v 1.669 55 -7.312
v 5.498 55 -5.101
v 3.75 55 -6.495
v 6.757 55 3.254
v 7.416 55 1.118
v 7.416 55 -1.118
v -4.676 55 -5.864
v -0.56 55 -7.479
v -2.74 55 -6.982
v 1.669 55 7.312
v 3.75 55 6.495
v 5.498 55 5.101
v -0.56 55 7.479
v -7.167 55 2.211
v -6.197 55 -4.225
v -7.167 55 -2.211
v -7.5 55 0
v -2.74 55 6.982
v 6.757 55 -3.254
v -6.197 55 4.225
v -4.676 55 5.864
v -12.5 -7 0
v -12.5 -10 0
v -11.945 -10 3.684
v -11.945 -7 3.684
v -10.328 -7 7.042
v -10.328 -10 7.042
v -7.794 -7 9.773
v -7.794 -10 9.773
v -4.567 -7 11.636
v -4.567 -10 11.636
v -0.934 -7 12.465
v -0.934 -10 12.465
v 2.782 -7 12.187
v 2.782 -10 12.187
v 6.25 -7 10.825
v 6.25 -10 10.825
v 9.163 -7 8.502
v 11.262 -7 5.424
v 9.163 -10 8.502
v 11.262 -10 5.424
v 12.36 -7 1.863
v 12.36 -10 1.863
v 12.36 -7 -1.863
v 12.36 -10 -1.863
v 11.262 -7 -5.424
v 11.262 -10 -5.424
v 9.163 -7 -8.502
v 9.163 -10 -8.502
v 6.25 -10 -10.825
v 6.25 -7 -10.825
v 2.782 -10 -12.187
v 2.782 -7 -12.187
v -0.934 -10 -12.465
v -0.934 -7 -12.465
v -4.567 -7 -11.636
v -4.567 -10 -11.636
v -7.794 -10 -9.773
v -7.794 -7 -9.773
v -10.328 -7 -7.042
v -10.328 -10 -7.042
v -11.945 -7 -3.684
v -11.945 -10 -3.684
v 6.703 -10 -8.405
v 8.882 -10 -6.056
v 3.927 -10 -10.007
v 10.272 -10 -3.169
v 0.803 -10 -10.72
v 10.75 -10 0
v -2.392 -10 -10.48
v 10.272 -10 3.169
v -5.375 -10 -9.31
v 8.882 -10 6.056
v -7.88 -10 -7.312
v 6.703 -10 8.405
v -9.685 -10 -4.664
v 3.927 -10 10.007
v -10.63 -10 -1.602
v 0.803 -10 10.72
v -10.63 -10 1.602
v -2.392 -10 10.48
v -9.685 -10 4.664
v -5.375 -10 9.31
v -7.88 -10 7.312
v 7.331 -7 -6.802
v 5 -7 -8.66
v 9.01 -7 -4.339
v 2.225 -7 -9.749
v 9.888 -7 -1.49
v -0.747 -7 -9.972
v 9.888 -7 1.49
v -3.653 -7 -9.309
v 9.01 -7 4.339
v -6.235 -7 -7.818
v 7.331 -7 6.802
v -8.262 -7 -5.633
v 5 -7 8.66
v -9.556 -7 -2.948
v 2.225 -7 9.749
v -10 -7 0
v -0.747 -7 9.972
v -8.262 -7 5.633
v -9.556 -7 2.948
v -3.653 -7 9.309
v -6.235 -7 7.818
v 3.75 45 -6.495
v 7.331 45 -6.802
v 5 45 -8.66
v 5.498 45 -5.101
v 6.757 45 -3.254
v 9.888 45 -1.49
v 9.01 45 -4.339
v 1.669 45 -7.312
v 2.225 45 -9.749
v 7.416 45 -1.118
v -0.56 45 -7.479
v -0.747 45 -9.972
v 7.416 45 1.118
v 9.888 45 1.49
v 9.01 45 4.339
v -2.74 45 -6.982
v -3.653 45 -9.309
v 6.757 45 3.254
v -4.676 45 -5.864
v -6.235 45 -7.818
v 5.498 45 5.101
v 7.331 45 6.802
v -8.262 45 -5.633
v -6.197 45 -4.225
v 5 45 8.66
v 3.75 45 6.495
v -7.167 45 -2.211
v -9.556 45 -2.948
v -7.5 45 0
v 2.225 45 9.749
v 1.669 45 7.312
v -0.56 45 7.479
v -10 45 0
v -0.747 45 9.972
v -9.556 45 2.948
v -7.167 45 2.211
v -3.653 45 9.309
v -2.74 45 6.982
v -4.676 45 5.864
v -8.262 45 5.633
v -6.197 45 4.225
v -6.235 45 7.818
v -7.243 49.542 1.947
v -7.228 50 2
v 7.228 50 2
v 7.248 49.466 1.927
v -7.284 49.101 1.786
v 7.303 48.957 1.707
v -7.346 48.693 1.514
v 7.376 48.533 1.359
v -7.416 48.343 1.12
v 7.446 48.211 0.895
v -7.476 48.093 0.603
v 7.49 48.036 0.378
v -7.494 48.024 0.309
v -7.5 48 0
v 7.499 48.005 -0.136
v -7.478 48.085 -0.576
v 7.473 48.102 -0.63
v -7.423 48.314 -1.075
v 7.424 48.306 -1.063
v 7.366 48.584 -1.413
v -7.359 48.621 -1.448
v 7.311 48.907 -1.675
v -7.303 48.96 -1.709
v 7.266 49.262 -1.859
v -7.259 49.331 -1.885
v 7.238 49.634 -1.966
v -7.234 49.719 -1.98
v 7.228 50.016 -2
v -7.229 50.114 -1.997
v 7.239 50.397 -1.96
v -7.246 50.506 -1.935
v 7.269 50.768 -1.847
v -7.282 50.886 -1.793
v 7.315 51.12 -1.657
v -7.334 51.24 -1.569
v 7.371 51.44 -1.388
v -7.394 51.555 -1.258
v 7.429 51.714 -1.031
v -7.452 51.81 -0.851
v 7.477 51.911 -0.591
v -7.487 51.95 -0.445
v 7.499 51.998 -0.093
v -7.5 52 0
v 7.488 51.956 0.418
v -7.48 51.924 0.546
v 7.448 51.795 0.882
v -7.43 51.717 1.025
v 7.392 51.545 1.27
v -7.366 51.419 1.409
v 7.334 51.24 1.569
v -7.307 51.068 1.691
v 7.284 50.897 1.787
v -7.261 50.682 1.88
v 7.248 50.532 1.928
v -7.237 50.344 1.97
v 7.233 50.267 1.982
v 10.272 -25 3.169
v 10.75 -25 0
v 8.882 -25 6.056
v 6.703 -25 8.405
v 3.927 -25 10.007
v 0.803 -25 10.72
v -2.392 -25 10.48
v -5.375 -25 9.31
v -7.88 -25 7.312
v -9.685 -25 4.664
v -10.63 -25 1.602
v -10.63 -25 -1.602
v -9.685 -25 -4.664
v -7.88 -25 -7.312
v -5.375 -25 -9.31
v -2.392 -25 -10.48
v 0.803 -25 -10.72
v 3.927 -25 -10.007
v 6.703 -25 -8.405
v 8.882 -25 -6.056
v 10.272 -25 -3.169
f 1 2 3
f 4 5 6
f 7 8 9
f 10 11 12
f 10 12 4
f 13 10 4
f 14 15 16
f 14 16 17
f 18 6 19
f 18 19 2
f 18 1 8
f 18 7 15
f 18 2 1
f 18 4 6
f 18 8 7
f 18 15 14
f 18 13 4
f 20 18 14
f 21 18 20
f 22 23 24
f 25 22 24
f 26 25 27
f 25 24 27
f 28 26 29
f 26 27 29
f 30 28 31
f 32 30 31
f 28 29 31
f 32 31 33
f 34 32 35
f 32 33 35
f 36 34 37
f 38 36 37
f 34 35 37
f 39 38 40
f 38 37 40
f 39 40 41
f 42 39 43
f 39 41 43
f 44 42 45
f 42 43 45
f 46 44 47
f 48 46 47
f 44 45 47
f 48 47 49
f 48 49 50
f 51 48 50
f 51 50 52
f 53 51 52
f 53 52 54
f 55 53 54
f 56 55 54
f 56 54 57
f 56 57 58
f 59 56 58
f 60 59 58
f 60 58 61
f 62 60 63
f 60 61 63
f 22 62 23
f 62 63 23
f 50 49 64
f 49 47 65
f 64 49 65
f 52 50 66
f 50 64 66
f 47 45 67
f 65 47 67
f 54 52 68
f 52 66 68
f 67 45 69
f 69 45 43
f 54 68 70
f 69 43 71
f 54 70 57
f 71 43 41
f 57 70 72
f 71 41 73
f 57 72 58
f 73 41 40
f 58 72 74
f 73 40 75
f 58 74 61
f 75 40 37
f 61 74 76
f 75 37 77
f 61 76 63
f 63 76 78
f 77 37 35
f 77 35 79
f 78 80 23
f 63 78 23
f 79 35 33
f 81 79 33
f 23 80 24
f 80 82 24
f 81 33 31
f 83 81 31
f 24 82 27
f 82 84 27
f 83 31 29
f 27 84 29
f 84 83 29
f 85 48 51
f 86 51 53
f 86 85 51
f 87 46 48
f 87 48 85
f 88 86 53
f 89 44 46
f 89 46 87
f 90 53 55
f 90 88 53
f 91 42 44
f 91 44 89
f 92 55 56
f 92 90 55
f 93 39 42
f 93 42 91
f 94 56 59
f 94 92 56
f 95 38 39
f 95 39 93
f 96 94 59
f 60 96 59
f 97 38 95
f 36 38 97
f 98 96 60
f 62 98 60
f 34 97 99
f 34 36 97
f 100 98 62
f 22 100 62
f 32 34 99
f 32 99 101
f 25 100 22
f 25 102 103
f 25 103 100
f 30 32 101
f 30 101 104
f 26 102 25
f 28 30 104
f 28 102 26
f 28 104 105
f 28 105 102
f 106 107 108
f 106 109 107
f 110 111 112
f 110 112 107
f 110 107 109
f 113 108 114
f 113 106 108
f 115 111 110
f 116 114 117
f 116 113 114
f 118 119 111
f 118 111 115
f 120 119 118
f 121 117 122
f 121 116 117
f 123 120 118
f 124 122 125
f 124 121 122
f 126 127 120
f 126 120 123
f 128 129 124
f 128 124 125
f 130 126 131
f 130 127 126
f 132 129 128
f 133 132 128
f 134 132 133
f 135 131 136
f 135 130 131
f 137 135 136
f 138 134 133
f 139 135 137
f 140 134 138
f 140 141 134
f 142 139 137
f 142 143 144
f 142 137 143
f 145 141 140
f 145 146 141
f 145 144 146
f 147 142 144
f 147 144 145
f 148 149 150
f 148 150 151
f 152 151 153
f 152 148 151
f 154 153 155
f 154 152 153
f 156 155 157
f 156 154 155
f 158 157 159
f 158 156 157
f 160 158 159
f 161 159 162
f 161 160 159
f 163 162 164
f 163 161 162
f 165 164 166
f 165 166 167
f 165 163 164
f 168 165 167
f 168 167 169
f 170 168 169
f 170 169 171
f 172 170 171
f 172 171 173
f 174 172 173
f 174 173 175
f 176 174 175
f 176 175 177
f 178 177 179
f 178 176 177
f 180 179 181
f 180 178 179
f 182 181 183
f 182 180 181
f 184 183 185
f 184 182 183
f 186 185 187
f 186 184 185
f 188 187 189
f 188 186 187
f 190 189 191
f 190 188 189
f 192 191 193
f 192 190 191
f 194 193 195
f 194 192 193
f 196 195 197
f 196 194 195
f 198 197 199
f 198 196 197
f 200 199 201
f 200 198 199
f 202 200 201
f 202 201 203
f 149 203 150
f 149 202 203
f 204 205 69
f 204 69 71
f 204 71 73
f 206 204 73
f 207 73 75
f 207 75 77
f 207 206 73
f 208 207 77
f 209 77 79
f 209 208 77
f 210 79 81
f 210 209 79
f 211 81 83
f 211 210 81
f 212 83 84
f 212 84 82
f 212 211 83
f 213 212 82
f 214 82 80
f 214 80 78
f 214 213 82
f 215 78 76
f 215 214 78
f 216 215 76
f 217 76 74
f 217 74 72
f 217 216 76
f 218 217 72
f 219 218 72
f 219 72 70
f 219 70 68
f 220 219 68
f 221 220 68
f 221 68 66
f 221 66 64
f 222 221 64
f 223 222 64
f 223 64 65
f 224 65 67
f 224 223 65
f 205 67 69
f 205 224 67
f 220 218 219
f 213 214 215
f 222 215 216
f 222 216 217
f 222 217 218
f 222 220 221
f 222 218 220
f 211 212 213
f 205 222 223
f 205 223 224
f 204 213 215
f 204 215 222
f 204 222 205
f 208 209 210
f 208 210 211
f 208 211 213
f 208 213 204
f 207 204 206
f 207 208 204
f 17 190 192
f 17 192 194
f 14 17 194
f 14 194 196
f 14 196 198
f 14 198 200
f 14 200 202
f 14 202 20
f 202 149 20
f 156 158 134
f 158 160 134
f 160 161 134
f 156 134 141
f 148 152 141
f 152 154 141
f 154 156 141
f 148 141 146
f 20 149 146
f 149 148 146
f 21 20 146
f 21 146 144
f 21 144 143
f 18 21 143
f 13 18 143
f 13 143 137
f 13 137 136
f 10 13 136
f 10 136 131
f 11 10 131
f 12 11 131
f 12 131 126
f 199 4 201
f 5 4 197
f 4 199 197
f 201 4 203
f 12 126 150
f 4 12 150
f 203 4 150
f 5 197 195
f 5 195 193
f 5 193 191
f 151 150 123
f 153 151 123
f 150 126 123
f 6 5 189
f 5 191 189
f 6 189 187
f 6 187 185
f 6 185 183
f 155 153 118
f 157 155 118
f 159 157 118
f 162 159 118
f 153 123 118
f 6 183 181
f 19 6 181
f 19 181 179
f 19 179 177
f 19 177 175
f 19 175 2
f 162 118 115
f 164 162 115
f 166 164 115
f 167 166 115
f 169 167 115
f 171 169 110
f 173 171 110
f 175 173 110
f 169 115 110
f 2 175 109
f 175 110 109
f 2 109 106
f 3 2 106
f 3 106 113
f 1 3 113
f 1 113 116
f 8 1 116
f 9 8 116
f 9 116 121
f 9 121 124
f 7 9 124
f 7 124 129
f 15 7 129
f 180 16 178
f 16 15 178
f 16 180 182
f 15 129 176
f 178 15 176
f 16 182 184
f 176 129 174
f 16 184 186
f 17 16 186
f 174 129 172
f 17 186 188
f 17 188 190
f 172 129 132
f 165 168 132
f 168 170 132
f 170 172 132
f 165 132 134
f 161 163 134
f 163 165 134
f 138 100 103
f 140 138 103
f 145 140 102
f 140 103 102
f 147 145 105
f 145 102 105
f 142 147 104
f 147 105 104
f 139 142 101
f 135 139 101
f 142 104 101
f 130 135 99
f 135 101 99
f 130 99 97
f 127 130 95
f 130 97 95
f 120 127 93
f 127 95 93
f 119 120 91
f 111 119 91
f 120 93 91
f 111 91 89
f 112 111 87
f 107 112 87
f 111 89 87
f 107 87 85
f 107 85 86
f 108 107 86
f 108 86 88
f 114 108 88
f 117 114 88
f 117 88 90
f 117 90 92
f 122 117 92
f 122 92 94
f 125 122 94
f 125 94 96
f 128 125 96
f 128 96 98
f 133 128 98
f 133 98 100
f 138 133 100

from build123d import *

# Parameters (mm, degrees)
SKETCH2_R               = 10
BOSS_EXTRUDE1_DEPTH     = 30
CUT_EXTRUDE1_START      = -10
SKETCH3_R               = 10
SKETCH3_R_2             = 7.5
CUT_EXTRUDE1_DEPTH      = 10
CUT_EXTRUDE3_DEPTH      = 10
CUT_EXTRUDE3_DEPTH_BACK = 10
SKETCH5_R               = 2
FILLET2_R               = 10
BOSS_EXTRUDE2_START     = -67.5
SKETCH7_R               = 10
BOSS_EXTRUDE2_DEPTH     = 67.5
SKETCH8_R               = 50
SKETCH8_R_2             = 10
CUT_EXTRUDE6_DEPTH      = 107.770782567
SKETCH10_R              = 10.75
SKETCH10_R_2            = 10
BOSS_EXTRUDE3_DEPTH     = 15
SKETCH11_R              = 12.5
BOSS_EXTRUDE4_DEPTH     = 3


with BuildPart() as part:
    # Sketch1 → Revolve1 (revolve)
    with BuildSketch(Plane.XY):
        Polygon((50, 25), (0, 25), (0, 22.5), (45, 22.5), (45, -22.5), (0, -22.5), (0, -25), (50, -25), align=None)
    revolve(axis=Axis((0, -25, 0), (0, 1, 0)))

    # Sketch2 → Boss-Extrude1 (add)
    with BuildSketch(Plane(origin=(0, 25, 0), x_dir=(1, 0, 0), z_dir=(0, 1, 0))):
        with Locations(Location((0, 0, 0), (0, 0, 180))):
            Circle(SKETCH2_R)
    extrude(amount=BOSS_EXTRUDE1_DEPTH)

    # Sketch3 → Cut-Extrude1 (cut)
    with BuildSketch(Plane(origin=(0, 55, 0), x_dir=(1, 0, 0), z_dir=(0, 1, 0)).offset(CUT_EXTRUDE1_START)):
        with Locations(Location((0, 0, 0), (0, 0, 180))):
            Circle(SKETCH3_R)
        with Locations(Location((0, 0, 0), (0, 0, 180))):
            Circle(SKETCH3_R_2, mode=Mode.SUBTRACT)
    extrude(amount=CUT_EXTRUDE1_DEPTH, mode=Mode.SUBTRACT)

    # Sketch5 → Cut-Extrude3 (cut, two sides: drawn at the far end of the back side and taken through both)
    with BuildSketch(Plane(origin=(0, 0, 0), x_dir=(0, 0, -1), z_dir=(1, 0, 0)).offset(-CUT_EXTRUDE3_DEPTH_BACK)):
        with Locations(Location((0, 50, 0), (0, 0, 180))):
            Circle(SKETCH5_R)
    extrude(amount=CUT_EXTRUDE3_DEPTH + CUT_EXTRUDE3_DEPTH_BACK, mode=Mode.SUBTRACT)

    # Fillet2
    fillet2_edges = [part.edges().sort_by_distance(p)[0] for p in [
        (-50, 25, 0),
    ]]
    fillet(fillet2_edges, radius=FILLET2_R)

    # Sketch7 → Boss-Extrude2 (add)
    with BuildSketch(Plane(origin=(0, 45, 0), x_dir=(1, 0, 0), z_dir=(0, 1, 0)).offset(BOSS_EXTRUDE2_START)):
        with Locations(Location((0, 0, 0), (0, 0, 180))):
            Circle(SKETCH7_R)
    extrude(amount=BOSS_EXTRUDE2_DEPTH)

    # Sketch8 → Cut-Extrude6 (cut, through all)
    with BuildSketch(Plane(origin=(0, 55, 0), x_dir=(1, 0, 0), z_dir=(0, 1, 0))):
        Circle(SKETCH8_R)
        with Locations(Location((0, 0, 0), (0, 0, 180))):
            Circle(SKETCH8_R_2, mode=Mode.SUBTRACT)
    extrude(amount=-CUT_EXTRUDE6_DEPTH, mode=Mode.SUBTRACT)

    # Sketch10 → Boss-Extrude3 (add)
    with BuildSketch(Plane.XZ.offset(25)):
        Circle(SKETCH10_R)
        Circle(SKETCH10_R_2, mode=Mode.SUBTRACT)
    extrude(amount=-BOSS_EXTRUDE3_DEPTH)

    # Sketch11 → Boss-Extrude4 (add)
    with BuildSketch(Plane(origin=(0, -10, 0), x_dir=(1, 0, 0), z_dir=(0, 1, 0))):
        with Locations(Location((0, 0, 0), (0, 0, 180))):
            Circle(SKETCH11_R)
    extrude(amount=BOSS_EXTRUDE4_DEPTH)


solid = part.part
